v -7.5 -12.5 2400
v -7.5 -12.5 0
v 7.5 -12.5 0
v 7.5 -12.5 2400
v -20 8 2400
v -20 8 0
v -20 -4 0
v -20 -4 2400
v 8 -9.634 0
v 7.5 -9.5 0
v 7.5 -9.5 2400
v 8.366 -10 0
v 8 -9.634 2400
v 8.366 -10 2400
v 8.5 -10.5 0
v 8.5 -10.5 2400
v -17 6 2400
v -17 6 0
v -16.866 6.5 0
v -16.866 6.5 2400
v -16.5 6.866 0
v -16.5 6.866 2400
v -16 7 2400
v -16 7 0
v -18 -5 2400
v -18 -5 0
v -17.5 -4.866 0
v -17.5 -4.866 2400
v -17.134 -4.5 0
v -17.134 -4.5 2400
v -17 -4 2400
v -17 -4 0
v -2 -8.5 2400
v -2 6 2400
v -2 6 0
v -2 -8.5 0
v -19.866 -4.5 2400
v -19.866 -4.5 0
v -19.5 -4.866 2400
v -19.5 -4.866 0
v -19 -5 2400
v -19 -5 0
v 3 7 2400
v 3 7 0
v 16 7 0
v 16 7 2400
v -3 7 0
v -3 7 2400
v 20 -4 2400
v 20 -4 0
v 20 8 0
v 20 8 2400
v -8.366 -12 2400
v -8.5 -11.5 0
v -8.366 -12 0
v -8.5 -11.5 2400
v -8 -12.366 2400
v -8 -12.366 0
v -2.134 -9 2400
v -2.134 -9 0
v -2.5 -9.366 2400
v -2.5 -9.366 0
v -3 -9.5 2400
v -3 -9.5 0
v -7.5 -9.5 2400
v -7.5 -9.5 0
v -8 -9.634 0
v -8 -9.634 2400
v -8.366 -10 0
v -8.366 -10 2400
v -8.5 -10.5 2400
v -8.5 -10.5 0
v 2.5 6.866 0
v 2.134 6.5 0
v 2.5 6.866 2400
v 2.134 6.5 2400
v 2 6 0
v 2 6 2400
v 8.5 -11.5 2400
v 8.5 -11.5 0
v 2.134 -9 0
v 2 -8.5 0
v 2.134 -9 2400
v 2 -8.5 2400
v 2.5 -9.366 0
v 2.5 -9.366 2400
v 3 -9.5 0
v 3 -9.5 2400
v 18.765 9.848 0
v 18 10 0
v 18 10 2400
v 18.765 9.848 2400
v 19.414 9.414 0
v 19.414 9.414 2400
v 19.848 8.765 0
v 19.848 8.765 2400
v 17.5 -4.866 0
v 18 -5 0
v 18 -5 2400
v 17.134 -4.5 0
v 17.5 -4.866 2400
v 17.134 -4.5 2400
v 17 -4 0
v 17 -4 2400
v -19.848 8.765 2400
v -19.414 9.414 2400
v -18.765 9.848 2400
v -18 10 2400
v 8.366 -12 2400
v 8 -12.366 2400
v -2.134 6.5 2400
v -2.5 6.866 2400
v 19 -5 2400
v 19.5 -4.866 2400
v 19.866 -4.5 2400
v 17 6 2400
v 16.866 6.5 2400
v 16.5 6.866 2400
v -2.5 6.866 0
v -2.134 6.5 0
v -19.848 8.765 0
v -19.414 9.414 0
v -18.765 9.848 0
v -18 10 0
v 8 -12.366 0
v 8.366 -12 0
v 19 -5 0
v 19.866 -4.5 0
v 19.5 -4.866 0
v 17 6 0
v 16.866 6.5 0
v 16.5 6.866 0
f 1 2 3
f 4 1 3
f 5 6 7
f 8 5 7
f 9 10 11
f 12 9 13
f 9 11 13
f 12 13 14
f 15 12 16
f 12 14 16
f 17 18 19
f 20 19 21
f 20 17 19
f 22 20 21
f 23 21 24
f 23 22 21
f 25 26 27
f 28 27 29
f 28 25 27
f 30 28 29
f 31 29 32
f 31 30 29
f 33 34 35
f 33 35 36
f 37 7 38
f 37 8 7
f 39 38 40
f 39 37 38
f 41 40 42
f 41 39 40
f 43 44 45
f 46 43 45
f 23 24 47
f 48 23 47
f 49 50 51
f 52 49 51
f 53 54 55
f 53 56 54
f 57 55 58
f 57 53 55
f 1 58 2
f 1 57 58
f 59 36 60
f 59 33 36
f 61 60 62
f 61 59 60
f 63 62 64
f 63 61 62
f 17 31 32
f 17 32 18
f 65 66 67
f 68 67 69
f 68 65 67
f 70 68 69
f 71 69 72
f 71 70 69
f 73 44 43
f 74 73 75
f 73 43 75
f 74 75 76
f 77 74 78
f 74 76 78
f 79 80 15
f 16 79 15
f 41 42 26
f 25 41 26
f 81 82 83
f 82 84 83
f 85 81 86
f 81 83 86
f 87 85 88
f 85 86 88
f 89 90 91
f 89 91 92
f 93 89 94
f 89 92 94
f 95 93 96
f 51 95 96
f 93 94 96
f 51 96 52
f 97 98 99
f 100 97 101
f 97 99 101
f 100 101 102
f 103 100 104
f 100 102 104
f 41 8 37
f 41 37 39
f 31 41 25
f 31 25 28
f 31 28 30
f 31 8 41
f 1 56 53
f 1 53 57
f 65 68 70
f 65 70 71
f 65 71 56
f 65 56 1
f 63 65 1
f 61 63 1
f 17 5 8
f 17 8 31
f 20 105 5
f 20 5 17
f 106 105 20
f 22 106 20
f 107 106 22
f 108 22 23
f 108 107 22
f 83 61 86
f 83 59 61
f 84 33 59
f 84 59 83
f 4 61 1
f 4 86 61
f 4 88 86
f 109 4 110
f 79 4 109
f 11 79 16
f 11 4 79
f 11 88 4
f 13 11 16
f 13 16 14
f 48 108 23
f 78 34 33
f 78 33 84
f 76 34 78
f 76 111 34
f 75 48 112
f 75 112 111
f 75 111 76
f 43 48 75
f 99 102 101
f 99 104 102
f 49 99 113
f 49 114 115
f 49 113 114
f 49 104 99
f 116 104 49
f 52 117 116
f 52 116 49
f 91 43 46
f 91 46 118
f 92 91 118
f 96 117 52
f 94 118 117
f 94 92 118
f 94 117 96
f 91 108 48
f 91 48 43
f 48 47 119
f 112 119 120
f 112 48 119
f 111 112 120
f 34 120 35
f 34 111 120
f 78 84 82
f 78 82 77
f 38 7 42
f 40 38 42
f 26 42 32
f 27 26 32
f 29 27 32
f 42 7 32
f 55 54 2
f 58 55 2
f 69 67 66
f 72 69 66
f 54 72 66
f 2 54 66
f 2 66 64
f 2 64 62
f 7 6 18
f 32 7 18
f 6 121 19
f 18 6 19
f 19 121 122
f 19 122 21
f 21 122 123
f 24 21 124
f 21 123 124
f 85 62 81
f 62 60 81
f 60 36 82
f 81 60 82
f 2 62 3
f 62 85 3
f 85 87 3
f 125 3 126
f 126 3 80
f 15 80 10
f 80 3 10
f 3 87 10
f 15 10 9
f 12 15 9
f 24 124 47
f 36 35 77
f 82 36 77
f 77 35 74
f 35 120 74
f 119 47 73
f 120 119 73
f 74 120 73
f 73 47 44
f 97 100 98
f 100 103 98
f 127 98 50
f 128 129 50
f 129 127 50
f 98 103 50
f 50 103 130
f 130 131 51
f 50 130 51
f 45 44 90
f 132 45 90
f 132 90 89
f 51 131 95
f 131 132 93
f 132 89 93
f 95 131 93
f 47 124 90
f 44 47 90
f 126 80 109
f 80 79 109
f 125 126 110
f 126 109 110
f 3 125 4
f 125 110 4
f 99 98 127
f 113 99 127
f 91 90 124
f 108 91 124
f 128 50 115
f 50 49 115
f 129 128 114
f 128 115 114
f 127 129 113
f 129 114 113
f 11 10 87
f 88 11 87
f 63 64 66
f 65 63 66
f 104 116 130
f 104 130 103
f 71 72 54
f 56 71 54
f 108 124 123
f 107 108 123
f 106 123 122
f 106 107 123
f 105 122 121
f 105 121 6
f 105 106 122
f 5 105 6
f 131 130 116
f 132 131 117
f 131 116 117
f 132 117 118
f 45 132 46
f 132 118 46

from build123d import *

# Parameters (mm, degrees)
F1_DEPTH = 2400
F2_R     = 2
F3_R     = 1


with BuildPart() as f1:
    # F0 (on Top) → F1 (new body)
    with BuildSketch(Plane.XY):
        Polygon((20, 10), (-20, 10), (-20, -5), (-17, -5), (-17, 7), (-2, 7), (-2, -9.5), (-8.5, -9.5), (-8.5, -12.5), (0, -12.5), (8.5, -12.5), (8.5, -9.5), (2, -9.5), (2, 7), (17, 7), (17, -5), (20, -5), align=None)
    extrude(amount=F1_DEPTH)

    # F2
    f2_edges = [f1.edges().sort_by_distance(p)[0] for p in [
        (-20, 10, 1200),
        (20, 10, 1200),
    ]]
    fillet(f2_edges, radius=F2_R)

    # F3
    f3_edges = [f1.edges().sort_by_distance(p)[0] for p in [
        (-20, -5, 1200),
        (-17, -5, 1200),
        (-17, 7, 1200),
        (-8.5, -12.5, 1200),
        (8.5, -12.5, 1200),
        (8.5, -9.5, 1200),
        (2, 7, 1200),
        (17, -5, 1200),
        (20, -5, 1200),
        (17, 7, 1200),
        (-2, 7, 1200),
        (-8.5, -9.5, 1200),
        (-2, -9.5, 1200),
        (2, -9.5, 1200),
    ]]
    fillet(f3_edges, radius=F3_R)


solid = f1.part
